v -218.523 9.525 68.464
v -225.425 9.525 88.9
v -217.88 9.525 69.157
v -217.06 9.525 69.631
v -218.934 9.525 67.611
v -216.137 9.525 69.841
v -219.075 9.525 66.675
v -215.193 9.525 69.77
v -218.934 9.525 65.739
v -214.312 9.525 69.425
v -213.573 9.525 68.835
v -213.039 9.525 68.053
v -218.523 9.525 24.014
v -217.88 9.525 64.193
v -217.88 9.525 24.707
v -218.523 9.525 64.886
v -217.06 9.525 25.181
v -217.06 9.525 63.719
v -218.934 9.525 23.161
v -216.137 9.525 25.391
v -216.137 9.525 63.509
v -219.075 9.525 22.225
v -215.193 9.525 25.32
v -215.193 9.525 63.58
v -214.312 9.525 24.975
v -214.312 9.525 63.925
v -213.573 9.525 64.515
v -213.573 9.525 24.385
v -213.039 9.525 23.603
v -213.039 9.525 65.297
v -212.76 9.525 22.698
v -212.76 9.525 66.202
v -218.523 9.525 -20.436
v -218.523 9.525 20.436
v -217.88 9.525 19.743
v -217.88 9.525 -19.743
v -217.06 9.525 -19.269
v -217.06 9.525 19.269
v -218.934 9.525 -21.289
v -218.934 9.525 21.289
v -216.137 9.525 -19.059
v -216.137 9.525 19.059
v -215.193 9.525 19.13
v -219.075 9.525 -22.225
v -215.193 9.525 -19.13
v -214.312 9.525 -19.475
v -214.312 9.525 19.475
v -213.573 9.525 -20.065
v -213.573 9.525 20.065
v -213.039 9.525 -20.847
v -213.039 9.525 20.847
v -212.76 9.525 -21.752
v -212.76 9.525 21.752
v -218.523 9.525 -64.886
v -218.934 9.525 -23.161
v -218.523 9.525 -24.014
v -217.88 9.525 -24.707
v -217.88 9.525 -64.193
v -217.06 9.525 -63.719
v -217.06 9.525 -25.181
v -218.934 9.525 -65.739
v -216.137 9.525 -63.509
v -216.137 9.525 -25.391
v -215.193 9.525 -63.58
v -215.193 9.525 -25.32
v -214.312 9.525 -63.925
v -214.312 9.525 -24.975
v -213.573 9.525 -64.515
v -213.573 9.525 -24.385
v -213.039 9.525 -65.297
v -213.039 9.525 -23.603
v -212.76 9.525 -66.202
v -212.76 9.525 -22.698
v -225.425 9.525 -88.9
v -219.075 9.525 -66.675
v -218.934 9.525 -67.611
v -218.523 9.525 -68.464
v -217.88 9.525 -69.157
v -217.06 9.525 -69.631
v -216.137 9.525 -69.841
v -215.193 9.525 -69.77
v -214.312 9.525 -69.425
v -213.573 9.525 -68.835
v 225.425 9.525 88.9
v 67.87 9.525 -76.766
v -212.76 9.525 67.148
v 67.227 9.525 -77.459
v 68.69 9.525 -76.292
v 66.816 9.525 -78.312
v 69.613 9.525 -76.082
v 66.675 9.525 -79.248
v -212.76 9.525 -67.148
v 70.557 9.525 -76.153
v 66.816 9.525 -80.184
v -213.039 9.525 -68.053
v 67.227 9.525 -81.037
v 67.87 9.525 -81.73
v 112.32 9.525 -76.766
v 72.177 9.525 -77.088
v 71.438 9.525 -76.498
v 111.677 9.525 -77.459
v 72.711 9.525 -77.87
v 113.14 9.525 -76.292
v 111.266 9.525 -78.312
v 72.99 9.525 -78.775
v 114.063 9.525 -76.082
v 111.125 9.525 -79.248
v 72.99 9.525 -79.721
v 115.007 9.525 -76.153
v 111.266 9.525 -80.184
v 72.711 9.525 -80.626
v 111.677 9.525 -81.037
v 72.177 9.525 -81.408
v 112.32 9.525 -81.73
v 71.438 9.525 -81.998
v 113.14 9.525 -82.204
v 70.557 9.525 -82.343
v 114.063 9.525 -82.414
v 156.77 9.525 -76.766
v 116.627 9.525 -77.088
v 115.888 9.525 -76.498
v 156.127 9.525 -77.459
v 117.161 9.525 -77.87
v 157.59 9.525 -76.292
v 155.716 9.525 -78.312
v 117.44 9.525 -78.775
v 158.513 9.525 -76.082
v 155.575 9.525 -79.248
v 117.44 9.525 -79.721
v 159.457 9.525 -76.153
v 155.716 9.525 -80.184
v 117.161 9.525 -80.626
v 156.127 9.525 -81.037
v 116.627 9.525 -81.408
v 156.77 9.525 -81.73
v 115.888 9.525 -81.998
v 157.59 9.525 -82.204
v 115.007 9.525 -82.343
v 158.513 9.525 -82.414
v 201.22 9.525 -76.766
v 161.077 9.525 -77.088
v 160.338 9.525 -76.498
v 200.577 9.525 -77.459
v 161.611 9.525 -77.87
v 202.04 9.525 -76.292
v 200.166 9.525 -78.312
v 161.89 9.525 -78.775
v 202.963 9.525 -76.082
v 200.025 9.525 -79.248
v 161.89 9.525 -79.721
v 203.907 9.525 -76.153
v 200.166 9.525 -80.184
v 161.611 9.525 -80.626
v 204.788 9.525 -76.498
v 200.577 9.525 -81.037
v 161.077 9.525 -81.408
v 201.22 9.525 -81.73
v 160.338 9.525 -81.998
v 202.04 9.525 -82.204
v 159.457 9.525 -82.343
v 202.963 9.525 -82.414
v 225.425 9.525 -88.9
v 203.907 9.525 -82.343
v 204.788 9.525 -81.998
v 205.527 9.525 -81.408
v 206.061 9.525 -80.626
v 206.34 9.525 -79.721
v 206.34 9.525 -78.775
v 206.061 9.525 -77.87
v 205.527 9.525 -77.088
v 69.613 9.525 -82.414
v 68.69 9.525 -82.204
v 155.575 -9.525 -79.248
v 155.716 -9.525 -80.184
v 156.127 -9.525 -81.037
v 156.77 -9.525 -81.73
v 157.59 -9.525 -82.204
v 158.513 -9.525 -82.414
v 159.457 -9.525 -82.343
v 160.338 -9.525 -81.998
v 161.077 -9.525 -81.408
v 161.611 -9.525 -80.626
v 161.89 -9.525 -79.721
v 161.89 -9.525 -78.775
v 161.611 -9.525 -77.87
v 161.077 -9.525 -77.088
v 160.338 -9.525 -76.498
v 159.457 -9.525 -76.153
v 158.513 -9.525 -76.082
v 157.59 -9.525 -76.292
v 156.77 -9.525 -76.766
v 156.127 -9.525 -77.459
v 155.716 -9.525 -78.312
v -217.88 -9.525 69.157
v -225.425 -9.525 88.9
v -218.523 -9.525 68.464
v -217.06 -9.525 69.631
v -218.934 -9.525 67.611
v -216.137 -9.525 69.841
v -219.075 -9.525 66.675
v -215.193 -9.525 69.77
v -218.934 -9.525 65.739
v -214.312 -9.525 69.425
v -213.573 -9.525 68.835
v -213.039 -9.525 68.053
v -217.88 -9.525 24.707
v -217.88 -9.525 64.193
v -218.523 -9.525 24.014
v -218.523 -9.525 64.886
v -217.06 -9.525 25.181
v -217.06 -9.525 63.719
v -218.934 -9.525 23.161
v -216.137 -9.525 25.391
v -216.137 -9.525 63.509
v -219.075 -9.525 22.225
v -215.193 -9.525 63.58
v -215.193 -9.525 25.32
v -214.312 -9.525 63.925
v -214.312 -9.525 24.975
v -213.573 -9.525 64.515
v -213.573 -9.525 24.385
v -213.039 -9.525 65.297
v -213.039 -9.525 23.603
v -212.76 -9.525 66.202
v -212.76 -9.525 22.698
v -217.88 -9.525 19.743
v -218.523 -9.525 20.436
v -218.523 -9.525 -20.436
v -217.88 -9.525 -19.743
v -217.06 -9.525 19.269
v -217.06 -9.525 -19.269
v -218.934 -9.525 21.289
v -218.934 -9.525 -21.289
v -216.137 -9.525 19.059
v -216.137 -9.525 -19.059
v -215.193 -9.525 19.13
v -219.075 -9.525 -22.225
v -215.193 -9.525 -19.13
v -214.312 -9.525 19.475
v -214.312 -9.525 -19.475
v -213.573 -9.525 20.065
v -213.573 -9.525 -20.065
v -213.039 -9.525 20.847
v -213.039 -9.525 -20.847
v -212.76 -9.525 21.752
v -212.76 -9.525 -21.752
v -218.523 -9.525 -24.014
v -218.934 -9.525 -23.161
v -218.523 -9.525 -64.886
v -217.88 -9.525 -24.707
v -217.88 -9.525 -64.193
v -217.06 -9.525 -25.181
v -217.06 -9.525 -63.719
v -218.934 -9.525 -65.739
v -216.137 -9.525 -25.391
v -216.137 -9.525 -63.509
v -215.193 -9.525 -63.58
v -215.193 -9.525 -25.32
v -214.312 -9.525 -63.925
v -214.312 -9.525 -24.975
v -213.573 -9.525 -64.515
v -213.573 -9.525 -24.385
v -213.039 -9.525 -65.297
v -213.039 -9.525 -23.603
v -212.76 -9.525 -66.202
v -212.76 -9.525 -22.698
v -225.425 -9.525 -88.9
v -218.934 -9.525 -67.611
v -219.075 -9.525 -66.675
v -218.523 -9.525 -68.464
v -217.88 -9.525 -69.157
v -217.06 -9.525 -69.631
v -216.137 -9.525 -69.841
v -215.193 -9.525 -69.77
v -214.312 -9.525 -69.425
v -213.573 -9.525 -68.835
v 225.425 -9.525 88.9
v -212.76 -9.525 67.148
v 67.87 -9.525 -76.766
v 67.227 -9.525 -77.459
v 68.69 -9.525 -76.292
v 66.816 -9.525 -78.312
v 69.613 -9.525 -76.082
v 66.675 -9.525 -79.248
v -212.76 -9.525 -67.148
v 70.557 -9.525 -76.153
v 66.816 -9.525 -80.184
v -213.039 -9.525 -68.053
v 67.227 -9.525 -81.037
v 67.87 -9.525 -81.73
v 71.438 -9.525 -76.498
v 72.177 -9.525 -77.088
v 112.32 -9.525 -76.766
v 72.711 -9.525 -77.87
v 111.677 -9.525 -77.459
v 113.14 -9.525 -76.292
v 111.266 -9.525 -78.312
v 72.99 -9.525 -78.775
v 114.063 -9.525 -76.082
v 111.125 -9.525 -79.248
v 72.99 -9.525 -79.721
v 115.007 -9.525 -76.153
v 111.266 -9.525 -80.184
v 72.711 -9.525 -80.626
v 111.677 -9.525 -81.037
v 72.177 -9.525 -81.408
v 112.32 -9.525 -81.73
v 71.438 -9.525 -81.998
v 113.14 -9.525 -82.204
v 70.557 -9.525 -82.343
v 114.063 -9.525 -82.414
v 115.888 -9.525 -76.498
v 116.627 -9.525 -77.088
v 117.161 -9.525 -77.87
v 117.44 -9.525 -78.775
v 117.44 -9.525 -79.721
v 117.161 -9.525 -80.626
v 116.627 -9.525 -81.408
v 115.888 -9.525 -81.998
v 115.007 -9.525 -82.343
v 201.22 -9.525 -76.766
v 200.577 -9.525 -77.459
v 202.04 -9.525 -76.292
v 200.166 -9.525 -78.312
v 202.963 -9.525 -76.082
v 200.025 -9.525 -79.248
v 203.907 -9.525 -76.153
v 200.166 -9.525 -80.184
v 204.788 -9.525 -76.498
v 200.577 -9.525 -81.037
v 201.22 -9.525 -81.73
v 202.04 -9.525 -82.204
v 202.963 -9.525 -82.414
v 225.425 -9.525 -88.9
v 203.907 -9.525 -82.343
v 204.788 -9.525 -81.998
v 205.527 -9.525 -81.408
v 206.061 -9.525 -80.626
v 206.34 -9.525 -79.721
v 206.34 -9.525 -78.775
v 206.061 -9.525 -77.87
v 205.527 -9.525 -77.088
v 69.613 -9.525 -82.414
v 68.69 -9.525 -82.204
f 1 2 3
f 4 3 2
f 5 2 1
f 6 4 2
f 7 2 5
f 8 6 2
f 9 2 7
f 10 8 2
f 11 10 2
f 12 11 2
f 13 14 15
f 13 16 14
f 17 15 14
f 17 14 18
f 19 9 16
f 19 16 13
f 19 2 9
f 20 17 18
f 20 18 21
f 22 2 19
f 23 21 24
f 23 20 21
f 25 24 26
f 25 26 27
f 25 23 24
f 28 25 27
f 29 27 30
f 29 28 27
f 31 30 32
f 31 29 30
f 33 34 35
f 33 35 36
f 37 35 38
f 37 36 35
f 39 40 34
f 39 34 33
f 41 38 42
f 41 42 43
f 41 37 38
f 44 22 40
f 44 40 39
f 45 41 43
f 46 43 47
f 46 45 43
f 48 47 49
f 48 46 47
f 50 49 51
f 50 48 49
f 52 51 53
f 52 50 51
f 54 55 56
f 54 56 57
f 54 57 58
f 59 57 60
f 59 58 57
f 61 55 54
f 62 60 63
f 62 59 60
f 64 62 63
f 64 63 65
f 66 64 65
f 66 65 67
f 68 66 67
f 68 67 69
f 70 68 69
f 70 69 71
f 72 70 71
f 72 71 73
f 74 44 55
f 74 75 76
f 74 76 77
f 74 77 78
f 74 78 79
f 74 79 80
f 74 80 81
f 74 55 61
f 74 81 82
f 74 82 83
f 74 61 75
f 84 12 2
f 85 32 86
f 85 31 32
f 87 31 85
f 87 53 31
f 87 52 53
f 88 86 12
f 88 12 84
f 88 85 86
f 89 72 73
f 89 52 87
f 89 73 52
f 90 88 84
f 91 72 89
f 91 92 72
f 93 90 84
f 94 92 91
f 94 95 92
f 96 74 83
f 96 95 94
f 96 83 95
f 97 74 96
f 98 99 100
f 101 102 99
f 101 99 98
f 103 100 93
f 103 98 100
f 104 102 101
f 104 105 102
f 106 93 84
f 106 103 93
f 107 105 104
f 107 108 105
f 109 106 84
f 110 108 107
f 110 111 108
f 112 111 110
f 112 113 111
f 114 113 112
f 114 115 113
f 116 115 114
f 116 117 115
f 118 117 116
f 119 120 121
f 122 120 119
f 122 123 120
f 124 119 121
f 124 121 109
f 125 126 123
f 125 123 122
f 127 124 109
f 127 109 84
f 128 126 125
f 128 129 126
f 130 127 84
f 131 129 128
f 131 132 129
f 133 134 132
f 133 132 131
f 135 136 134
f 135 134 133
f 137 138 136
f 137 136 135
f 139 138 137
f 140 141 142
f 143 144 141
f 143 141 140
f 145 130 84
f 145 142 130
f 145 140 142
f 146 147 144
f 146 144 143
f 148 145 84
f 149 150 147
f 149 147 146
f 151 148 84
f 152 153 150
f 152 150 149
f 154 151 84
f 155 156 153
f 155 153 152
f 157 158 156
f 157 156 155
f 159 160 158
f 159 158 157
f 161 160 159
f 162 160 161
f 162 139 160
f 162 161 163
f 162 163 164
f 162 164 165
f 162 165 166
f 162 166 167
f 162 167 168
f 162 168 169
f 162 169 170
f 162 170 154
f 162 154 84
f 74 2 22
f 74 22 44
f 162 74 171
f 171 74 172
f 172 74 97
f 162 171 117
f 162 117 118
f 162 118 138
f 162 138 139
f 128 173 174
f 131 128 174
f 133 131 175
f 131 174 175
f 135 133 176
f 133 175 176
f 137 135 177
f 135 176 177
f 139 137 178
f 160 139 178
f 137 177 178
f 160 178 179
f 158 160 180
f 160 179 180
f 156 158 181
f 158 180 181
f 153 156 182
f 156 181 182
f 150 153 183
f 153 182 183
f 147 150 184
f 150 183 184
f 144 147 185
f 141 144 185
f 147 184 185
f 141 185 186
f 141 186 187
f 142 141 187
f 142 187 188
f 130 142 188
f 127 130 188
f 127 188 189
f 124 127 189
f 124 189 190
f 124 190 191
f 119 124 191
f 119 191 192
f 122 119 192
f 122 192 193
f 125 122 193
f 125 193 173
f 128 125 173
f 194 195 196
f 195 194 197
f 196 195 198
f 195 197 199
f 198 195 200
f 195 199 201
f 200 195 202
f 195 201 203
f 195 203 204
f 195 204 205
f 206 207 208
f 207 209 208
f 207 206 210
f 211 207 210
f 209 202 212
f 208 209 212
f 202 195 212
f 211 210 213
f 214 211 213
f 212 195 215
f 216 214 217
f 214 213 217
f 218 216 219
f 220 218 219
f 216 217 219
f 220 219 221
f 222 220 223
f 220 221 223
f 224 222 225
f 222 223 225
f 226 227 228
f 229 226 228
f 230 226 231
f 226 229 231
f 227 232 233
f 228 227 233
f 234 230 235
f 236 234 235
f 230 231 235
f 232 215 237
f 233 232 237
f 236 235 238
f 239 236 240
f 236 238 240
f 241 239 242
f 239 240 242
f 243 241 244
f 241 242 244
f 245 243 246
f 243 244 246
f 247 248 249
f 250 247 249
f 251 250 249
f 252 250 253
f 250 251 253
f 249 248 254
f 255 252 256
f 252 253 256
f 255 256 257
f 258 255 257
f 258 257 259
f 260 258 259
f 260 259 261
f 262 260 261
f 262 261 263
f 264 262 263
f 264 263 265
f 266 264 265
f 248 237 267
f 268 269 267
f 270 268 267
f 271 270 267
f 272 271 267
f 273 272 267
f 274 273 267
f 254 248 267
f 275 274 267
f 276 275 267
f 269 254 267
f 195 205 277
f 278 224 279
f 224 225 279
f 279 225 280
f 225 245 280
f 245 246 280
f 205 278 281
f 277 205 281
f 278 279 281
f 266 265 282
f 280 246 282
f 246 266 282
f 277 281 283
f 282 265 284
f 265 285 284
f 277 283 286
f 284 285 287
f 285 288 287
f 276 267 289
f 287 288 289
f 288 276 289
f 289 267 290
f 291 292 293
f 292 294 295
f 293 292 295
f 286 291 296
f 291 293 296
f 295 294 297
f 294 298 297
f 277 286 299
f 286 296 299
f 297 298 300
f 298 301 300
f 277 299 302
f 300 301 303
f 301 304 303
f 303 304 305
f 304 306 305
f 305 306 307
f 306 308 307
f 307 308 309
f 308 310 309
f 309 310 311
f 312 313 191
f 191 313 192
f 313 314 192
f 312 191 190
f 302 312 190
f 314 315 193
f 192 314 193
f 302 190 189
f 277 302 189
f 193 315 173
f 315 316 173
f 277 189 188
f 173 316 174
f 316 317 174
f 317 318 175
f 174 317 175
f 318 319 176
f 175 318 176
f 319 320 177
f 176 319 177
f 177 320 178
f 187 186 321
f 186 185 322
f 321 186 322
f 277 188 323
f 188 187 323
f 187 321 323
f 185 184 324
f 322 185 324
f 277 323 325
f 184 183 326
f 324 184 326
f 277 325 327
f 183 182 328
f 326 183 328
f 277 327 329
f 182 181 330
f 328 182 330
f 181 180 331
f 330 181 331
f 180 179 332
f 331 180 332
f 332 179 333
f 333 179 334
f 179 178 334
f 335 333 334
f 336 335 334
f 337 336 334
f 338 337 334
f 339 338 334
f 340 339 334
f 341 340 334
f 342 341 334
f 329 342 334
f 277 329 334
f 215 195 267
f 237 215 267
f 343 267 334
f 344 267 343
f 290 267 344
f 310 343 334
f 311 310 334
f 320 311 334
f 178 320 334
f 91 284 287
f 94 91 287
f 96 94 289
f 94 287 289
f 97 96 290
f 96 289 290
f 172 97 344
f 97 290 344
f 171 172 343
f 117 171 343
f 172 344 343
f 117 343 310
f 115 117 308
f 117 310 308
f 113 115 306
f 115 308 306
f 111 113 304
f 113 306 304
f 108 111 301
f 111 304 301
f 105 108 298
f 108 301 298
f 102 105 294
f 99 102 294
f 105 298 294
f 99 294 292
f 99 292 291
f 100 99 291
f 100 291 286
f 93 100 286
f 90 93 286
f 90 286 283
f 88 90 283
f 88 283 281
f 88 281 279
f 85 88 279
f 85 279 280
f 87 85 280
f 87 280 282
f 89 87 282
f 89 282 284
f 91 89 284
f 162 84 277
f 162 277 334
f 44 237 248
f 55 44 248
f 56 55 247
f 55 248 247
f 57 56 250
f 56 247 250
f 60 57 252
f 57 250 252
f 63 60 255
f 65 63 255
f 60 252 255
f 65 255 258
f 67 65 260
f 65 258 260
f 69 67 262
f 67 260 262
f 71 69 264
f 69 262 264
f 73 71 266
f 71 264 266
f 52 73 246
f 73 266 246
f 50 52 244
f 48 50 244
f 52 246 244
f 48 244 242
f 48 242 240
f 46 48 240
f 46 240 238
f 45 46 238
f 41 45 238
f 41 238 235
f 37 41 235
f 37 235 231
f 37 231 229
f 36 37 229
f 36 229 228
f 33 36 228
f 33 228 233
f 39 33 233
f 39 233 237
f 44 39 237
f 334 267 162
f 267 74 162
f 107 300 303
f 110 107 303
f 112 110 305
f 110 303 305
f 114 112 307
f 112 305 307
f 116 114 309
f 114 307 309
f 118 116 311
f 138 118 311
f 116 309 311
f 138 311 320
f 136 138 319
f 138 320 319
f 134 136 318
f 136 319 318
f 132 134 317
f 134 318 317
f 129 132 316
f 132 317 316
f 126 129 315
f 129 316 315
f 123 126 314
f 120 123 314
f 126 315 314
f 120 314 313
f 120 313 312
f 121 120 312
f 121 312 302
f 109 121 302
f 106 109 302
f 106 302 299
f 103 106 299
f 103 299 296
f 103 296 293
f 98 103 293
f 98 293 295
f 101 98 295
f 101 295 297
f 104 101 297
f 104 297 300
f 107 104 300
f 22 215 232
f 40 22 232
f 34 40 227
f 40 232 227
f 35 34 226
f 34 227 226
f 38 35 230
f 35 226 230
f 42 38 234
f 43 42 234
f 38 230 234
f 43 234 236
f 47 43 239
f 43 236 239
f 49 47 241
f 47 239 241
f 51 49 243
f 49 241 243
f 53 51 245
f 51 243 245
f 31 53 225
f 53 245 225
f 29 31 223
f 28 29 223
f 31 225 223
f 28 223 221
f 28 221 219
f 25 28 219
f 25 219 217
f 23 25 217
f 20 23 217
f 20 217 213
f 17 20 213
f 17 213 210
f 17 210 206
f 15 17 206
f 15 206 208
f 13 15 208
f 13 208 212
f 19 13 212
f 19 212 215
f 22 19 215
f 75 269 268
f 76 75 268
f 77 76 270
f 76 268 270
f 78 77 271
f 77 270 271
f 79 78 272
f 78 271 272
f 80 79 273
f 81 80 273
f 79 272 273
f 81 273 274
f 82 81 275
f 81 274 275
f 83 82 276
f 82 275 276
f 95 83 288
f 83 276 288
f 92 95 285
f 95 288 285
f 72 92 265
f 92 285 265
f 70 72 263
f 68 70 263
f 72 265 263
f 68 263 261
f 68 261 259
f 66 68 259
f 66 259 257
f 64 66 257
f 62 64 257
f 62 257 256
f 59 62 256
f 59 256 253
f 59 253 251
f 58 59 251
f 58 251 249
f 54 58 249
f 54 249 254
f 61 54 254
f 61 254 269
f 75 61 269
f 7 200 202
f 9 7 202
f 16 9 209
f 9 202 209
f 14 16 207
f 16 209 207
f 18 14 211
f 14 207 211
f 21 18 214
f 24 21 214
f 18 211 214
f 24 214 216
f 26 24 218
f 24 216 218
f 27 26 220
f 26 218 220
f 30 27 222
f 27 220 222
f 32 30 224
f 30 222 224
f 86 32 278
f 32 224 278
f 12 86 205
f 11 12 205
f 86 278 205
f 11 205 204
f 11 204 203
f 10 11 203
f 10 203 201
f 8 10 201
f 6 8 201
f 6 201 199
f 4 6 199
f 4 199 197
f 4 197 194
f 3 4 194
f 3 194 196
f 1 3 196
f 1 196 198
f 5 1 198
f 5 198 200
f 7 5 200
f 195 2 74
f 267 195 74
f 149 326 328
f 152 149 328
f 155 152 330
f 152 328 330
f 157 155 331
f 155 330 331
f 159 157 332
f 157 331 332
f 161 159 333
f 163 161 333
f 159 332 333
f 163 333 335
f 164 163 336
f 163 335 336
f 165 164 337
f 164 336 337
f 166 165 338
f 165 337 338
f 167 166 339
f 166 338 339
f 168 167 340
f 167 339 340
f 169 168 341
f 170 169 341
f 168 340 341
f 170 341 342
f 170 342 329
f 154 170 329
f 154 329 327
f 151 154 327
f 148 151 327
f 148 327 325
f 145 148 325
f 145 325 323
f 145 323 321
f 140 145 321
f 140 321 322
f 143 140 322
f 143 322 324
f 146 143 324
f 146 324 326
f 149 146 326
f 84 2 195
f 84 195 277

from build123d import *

# Parameters (mm, degrees)
SKETCH1_W                       = 450.85
SKETCH1_H                       = 177.8
BOSS_EXTRUDE1_DEPTH             = 9.525
F_1_4_0_25_DIAMETER_HOLE2_D     = 6.35
F_1_4_0_25_DIAMETER_HOLE2_DEPTH = 25.4
F_1_4_0_25_DIAMETER_HOLE2_TIP   = 1.907732465
F_1_4_0_25_DIAMETER_HOLE3_D     = 6.35
F_1_4_0_25_DIAMETER_HOLE3_DEPTH = 25.4
F_1_4_0_25_DIAMETER_HOLE3_TIP   = 1.907732465


with BuildPart() as part:
    # Sketch1 → Boss-Extrude1 (new body, symmetric)
    with BuildSketch(Plane(origin=(0, 0, 0), x_dir=(1, 0, 0), z_dir=(0, 1, 0))):
        Rectangle(SKETCH1_W, SKETCH1_H)
    extrude(amount=BOSS_EXTRUDE1_DEPTH, both=True)

    # 1/4 (0.25) Diameter Hole2
    with Locations(Plane(origin=(0, 9.525, 0), x_dir=(1, 0, 0), z_dir=(0, 1, 0))):
        with Locations((-215.9, 66.675), (-215.9, 22.225), (-215.9, -22.225), (-215.9, -66.675)):
            Hole(F_1_4_0_25_DIAMETER_HOLE2_D / 2, depth=F_1_4_0_25_DIAMETER_HOLE2_DEPTH)
            with Locations((0, 0, -(F_1_4_0_25_DIAMETER_HOLE2_DEPTH + F_1_4_0_25_DIAMETER_HOLE2_TIP / 2))):  # 118° drill point
                Cone(0, F_1_4_0_25_DIAMETER_HOLE2_D / 2, F_1_4_0_25_DIAMETER_HOLE2_TIP, mode=Mode.SUBTRACT)

    # 1/4 (0.25) Diameter Hole3
    with Locations(Plane(origin=(0, 9.525, 0), x_dir=(1, 0, 0), z_dir=(0, 1, 0))):
        with Locations((203.2, 79.248), (158.75, 79.248), (114.3, 79.248), (69.85, 79.248)):
            Hole(F_1_4_0_25_DIAMETER_HOLE3_D / 2, depth=F_1_4_0_25_DIAMETER_HOLE3_DEPTH)
            with Locations((0, 0, -(F_1_4_0_25_DIAMETER_HOLE3_DEPTH + F_1_4_0_25_DIAMETER_HOLE3_TIP / 2))):  # 118° drill point
                Cone(0, F_1_4_0_25_DIAMETER_HOLE3_D / 2, F_1_4_0_25_DIAMETER_HOLE3_TIP, mode=Mode.SUBTRACT)


solid = part.part
